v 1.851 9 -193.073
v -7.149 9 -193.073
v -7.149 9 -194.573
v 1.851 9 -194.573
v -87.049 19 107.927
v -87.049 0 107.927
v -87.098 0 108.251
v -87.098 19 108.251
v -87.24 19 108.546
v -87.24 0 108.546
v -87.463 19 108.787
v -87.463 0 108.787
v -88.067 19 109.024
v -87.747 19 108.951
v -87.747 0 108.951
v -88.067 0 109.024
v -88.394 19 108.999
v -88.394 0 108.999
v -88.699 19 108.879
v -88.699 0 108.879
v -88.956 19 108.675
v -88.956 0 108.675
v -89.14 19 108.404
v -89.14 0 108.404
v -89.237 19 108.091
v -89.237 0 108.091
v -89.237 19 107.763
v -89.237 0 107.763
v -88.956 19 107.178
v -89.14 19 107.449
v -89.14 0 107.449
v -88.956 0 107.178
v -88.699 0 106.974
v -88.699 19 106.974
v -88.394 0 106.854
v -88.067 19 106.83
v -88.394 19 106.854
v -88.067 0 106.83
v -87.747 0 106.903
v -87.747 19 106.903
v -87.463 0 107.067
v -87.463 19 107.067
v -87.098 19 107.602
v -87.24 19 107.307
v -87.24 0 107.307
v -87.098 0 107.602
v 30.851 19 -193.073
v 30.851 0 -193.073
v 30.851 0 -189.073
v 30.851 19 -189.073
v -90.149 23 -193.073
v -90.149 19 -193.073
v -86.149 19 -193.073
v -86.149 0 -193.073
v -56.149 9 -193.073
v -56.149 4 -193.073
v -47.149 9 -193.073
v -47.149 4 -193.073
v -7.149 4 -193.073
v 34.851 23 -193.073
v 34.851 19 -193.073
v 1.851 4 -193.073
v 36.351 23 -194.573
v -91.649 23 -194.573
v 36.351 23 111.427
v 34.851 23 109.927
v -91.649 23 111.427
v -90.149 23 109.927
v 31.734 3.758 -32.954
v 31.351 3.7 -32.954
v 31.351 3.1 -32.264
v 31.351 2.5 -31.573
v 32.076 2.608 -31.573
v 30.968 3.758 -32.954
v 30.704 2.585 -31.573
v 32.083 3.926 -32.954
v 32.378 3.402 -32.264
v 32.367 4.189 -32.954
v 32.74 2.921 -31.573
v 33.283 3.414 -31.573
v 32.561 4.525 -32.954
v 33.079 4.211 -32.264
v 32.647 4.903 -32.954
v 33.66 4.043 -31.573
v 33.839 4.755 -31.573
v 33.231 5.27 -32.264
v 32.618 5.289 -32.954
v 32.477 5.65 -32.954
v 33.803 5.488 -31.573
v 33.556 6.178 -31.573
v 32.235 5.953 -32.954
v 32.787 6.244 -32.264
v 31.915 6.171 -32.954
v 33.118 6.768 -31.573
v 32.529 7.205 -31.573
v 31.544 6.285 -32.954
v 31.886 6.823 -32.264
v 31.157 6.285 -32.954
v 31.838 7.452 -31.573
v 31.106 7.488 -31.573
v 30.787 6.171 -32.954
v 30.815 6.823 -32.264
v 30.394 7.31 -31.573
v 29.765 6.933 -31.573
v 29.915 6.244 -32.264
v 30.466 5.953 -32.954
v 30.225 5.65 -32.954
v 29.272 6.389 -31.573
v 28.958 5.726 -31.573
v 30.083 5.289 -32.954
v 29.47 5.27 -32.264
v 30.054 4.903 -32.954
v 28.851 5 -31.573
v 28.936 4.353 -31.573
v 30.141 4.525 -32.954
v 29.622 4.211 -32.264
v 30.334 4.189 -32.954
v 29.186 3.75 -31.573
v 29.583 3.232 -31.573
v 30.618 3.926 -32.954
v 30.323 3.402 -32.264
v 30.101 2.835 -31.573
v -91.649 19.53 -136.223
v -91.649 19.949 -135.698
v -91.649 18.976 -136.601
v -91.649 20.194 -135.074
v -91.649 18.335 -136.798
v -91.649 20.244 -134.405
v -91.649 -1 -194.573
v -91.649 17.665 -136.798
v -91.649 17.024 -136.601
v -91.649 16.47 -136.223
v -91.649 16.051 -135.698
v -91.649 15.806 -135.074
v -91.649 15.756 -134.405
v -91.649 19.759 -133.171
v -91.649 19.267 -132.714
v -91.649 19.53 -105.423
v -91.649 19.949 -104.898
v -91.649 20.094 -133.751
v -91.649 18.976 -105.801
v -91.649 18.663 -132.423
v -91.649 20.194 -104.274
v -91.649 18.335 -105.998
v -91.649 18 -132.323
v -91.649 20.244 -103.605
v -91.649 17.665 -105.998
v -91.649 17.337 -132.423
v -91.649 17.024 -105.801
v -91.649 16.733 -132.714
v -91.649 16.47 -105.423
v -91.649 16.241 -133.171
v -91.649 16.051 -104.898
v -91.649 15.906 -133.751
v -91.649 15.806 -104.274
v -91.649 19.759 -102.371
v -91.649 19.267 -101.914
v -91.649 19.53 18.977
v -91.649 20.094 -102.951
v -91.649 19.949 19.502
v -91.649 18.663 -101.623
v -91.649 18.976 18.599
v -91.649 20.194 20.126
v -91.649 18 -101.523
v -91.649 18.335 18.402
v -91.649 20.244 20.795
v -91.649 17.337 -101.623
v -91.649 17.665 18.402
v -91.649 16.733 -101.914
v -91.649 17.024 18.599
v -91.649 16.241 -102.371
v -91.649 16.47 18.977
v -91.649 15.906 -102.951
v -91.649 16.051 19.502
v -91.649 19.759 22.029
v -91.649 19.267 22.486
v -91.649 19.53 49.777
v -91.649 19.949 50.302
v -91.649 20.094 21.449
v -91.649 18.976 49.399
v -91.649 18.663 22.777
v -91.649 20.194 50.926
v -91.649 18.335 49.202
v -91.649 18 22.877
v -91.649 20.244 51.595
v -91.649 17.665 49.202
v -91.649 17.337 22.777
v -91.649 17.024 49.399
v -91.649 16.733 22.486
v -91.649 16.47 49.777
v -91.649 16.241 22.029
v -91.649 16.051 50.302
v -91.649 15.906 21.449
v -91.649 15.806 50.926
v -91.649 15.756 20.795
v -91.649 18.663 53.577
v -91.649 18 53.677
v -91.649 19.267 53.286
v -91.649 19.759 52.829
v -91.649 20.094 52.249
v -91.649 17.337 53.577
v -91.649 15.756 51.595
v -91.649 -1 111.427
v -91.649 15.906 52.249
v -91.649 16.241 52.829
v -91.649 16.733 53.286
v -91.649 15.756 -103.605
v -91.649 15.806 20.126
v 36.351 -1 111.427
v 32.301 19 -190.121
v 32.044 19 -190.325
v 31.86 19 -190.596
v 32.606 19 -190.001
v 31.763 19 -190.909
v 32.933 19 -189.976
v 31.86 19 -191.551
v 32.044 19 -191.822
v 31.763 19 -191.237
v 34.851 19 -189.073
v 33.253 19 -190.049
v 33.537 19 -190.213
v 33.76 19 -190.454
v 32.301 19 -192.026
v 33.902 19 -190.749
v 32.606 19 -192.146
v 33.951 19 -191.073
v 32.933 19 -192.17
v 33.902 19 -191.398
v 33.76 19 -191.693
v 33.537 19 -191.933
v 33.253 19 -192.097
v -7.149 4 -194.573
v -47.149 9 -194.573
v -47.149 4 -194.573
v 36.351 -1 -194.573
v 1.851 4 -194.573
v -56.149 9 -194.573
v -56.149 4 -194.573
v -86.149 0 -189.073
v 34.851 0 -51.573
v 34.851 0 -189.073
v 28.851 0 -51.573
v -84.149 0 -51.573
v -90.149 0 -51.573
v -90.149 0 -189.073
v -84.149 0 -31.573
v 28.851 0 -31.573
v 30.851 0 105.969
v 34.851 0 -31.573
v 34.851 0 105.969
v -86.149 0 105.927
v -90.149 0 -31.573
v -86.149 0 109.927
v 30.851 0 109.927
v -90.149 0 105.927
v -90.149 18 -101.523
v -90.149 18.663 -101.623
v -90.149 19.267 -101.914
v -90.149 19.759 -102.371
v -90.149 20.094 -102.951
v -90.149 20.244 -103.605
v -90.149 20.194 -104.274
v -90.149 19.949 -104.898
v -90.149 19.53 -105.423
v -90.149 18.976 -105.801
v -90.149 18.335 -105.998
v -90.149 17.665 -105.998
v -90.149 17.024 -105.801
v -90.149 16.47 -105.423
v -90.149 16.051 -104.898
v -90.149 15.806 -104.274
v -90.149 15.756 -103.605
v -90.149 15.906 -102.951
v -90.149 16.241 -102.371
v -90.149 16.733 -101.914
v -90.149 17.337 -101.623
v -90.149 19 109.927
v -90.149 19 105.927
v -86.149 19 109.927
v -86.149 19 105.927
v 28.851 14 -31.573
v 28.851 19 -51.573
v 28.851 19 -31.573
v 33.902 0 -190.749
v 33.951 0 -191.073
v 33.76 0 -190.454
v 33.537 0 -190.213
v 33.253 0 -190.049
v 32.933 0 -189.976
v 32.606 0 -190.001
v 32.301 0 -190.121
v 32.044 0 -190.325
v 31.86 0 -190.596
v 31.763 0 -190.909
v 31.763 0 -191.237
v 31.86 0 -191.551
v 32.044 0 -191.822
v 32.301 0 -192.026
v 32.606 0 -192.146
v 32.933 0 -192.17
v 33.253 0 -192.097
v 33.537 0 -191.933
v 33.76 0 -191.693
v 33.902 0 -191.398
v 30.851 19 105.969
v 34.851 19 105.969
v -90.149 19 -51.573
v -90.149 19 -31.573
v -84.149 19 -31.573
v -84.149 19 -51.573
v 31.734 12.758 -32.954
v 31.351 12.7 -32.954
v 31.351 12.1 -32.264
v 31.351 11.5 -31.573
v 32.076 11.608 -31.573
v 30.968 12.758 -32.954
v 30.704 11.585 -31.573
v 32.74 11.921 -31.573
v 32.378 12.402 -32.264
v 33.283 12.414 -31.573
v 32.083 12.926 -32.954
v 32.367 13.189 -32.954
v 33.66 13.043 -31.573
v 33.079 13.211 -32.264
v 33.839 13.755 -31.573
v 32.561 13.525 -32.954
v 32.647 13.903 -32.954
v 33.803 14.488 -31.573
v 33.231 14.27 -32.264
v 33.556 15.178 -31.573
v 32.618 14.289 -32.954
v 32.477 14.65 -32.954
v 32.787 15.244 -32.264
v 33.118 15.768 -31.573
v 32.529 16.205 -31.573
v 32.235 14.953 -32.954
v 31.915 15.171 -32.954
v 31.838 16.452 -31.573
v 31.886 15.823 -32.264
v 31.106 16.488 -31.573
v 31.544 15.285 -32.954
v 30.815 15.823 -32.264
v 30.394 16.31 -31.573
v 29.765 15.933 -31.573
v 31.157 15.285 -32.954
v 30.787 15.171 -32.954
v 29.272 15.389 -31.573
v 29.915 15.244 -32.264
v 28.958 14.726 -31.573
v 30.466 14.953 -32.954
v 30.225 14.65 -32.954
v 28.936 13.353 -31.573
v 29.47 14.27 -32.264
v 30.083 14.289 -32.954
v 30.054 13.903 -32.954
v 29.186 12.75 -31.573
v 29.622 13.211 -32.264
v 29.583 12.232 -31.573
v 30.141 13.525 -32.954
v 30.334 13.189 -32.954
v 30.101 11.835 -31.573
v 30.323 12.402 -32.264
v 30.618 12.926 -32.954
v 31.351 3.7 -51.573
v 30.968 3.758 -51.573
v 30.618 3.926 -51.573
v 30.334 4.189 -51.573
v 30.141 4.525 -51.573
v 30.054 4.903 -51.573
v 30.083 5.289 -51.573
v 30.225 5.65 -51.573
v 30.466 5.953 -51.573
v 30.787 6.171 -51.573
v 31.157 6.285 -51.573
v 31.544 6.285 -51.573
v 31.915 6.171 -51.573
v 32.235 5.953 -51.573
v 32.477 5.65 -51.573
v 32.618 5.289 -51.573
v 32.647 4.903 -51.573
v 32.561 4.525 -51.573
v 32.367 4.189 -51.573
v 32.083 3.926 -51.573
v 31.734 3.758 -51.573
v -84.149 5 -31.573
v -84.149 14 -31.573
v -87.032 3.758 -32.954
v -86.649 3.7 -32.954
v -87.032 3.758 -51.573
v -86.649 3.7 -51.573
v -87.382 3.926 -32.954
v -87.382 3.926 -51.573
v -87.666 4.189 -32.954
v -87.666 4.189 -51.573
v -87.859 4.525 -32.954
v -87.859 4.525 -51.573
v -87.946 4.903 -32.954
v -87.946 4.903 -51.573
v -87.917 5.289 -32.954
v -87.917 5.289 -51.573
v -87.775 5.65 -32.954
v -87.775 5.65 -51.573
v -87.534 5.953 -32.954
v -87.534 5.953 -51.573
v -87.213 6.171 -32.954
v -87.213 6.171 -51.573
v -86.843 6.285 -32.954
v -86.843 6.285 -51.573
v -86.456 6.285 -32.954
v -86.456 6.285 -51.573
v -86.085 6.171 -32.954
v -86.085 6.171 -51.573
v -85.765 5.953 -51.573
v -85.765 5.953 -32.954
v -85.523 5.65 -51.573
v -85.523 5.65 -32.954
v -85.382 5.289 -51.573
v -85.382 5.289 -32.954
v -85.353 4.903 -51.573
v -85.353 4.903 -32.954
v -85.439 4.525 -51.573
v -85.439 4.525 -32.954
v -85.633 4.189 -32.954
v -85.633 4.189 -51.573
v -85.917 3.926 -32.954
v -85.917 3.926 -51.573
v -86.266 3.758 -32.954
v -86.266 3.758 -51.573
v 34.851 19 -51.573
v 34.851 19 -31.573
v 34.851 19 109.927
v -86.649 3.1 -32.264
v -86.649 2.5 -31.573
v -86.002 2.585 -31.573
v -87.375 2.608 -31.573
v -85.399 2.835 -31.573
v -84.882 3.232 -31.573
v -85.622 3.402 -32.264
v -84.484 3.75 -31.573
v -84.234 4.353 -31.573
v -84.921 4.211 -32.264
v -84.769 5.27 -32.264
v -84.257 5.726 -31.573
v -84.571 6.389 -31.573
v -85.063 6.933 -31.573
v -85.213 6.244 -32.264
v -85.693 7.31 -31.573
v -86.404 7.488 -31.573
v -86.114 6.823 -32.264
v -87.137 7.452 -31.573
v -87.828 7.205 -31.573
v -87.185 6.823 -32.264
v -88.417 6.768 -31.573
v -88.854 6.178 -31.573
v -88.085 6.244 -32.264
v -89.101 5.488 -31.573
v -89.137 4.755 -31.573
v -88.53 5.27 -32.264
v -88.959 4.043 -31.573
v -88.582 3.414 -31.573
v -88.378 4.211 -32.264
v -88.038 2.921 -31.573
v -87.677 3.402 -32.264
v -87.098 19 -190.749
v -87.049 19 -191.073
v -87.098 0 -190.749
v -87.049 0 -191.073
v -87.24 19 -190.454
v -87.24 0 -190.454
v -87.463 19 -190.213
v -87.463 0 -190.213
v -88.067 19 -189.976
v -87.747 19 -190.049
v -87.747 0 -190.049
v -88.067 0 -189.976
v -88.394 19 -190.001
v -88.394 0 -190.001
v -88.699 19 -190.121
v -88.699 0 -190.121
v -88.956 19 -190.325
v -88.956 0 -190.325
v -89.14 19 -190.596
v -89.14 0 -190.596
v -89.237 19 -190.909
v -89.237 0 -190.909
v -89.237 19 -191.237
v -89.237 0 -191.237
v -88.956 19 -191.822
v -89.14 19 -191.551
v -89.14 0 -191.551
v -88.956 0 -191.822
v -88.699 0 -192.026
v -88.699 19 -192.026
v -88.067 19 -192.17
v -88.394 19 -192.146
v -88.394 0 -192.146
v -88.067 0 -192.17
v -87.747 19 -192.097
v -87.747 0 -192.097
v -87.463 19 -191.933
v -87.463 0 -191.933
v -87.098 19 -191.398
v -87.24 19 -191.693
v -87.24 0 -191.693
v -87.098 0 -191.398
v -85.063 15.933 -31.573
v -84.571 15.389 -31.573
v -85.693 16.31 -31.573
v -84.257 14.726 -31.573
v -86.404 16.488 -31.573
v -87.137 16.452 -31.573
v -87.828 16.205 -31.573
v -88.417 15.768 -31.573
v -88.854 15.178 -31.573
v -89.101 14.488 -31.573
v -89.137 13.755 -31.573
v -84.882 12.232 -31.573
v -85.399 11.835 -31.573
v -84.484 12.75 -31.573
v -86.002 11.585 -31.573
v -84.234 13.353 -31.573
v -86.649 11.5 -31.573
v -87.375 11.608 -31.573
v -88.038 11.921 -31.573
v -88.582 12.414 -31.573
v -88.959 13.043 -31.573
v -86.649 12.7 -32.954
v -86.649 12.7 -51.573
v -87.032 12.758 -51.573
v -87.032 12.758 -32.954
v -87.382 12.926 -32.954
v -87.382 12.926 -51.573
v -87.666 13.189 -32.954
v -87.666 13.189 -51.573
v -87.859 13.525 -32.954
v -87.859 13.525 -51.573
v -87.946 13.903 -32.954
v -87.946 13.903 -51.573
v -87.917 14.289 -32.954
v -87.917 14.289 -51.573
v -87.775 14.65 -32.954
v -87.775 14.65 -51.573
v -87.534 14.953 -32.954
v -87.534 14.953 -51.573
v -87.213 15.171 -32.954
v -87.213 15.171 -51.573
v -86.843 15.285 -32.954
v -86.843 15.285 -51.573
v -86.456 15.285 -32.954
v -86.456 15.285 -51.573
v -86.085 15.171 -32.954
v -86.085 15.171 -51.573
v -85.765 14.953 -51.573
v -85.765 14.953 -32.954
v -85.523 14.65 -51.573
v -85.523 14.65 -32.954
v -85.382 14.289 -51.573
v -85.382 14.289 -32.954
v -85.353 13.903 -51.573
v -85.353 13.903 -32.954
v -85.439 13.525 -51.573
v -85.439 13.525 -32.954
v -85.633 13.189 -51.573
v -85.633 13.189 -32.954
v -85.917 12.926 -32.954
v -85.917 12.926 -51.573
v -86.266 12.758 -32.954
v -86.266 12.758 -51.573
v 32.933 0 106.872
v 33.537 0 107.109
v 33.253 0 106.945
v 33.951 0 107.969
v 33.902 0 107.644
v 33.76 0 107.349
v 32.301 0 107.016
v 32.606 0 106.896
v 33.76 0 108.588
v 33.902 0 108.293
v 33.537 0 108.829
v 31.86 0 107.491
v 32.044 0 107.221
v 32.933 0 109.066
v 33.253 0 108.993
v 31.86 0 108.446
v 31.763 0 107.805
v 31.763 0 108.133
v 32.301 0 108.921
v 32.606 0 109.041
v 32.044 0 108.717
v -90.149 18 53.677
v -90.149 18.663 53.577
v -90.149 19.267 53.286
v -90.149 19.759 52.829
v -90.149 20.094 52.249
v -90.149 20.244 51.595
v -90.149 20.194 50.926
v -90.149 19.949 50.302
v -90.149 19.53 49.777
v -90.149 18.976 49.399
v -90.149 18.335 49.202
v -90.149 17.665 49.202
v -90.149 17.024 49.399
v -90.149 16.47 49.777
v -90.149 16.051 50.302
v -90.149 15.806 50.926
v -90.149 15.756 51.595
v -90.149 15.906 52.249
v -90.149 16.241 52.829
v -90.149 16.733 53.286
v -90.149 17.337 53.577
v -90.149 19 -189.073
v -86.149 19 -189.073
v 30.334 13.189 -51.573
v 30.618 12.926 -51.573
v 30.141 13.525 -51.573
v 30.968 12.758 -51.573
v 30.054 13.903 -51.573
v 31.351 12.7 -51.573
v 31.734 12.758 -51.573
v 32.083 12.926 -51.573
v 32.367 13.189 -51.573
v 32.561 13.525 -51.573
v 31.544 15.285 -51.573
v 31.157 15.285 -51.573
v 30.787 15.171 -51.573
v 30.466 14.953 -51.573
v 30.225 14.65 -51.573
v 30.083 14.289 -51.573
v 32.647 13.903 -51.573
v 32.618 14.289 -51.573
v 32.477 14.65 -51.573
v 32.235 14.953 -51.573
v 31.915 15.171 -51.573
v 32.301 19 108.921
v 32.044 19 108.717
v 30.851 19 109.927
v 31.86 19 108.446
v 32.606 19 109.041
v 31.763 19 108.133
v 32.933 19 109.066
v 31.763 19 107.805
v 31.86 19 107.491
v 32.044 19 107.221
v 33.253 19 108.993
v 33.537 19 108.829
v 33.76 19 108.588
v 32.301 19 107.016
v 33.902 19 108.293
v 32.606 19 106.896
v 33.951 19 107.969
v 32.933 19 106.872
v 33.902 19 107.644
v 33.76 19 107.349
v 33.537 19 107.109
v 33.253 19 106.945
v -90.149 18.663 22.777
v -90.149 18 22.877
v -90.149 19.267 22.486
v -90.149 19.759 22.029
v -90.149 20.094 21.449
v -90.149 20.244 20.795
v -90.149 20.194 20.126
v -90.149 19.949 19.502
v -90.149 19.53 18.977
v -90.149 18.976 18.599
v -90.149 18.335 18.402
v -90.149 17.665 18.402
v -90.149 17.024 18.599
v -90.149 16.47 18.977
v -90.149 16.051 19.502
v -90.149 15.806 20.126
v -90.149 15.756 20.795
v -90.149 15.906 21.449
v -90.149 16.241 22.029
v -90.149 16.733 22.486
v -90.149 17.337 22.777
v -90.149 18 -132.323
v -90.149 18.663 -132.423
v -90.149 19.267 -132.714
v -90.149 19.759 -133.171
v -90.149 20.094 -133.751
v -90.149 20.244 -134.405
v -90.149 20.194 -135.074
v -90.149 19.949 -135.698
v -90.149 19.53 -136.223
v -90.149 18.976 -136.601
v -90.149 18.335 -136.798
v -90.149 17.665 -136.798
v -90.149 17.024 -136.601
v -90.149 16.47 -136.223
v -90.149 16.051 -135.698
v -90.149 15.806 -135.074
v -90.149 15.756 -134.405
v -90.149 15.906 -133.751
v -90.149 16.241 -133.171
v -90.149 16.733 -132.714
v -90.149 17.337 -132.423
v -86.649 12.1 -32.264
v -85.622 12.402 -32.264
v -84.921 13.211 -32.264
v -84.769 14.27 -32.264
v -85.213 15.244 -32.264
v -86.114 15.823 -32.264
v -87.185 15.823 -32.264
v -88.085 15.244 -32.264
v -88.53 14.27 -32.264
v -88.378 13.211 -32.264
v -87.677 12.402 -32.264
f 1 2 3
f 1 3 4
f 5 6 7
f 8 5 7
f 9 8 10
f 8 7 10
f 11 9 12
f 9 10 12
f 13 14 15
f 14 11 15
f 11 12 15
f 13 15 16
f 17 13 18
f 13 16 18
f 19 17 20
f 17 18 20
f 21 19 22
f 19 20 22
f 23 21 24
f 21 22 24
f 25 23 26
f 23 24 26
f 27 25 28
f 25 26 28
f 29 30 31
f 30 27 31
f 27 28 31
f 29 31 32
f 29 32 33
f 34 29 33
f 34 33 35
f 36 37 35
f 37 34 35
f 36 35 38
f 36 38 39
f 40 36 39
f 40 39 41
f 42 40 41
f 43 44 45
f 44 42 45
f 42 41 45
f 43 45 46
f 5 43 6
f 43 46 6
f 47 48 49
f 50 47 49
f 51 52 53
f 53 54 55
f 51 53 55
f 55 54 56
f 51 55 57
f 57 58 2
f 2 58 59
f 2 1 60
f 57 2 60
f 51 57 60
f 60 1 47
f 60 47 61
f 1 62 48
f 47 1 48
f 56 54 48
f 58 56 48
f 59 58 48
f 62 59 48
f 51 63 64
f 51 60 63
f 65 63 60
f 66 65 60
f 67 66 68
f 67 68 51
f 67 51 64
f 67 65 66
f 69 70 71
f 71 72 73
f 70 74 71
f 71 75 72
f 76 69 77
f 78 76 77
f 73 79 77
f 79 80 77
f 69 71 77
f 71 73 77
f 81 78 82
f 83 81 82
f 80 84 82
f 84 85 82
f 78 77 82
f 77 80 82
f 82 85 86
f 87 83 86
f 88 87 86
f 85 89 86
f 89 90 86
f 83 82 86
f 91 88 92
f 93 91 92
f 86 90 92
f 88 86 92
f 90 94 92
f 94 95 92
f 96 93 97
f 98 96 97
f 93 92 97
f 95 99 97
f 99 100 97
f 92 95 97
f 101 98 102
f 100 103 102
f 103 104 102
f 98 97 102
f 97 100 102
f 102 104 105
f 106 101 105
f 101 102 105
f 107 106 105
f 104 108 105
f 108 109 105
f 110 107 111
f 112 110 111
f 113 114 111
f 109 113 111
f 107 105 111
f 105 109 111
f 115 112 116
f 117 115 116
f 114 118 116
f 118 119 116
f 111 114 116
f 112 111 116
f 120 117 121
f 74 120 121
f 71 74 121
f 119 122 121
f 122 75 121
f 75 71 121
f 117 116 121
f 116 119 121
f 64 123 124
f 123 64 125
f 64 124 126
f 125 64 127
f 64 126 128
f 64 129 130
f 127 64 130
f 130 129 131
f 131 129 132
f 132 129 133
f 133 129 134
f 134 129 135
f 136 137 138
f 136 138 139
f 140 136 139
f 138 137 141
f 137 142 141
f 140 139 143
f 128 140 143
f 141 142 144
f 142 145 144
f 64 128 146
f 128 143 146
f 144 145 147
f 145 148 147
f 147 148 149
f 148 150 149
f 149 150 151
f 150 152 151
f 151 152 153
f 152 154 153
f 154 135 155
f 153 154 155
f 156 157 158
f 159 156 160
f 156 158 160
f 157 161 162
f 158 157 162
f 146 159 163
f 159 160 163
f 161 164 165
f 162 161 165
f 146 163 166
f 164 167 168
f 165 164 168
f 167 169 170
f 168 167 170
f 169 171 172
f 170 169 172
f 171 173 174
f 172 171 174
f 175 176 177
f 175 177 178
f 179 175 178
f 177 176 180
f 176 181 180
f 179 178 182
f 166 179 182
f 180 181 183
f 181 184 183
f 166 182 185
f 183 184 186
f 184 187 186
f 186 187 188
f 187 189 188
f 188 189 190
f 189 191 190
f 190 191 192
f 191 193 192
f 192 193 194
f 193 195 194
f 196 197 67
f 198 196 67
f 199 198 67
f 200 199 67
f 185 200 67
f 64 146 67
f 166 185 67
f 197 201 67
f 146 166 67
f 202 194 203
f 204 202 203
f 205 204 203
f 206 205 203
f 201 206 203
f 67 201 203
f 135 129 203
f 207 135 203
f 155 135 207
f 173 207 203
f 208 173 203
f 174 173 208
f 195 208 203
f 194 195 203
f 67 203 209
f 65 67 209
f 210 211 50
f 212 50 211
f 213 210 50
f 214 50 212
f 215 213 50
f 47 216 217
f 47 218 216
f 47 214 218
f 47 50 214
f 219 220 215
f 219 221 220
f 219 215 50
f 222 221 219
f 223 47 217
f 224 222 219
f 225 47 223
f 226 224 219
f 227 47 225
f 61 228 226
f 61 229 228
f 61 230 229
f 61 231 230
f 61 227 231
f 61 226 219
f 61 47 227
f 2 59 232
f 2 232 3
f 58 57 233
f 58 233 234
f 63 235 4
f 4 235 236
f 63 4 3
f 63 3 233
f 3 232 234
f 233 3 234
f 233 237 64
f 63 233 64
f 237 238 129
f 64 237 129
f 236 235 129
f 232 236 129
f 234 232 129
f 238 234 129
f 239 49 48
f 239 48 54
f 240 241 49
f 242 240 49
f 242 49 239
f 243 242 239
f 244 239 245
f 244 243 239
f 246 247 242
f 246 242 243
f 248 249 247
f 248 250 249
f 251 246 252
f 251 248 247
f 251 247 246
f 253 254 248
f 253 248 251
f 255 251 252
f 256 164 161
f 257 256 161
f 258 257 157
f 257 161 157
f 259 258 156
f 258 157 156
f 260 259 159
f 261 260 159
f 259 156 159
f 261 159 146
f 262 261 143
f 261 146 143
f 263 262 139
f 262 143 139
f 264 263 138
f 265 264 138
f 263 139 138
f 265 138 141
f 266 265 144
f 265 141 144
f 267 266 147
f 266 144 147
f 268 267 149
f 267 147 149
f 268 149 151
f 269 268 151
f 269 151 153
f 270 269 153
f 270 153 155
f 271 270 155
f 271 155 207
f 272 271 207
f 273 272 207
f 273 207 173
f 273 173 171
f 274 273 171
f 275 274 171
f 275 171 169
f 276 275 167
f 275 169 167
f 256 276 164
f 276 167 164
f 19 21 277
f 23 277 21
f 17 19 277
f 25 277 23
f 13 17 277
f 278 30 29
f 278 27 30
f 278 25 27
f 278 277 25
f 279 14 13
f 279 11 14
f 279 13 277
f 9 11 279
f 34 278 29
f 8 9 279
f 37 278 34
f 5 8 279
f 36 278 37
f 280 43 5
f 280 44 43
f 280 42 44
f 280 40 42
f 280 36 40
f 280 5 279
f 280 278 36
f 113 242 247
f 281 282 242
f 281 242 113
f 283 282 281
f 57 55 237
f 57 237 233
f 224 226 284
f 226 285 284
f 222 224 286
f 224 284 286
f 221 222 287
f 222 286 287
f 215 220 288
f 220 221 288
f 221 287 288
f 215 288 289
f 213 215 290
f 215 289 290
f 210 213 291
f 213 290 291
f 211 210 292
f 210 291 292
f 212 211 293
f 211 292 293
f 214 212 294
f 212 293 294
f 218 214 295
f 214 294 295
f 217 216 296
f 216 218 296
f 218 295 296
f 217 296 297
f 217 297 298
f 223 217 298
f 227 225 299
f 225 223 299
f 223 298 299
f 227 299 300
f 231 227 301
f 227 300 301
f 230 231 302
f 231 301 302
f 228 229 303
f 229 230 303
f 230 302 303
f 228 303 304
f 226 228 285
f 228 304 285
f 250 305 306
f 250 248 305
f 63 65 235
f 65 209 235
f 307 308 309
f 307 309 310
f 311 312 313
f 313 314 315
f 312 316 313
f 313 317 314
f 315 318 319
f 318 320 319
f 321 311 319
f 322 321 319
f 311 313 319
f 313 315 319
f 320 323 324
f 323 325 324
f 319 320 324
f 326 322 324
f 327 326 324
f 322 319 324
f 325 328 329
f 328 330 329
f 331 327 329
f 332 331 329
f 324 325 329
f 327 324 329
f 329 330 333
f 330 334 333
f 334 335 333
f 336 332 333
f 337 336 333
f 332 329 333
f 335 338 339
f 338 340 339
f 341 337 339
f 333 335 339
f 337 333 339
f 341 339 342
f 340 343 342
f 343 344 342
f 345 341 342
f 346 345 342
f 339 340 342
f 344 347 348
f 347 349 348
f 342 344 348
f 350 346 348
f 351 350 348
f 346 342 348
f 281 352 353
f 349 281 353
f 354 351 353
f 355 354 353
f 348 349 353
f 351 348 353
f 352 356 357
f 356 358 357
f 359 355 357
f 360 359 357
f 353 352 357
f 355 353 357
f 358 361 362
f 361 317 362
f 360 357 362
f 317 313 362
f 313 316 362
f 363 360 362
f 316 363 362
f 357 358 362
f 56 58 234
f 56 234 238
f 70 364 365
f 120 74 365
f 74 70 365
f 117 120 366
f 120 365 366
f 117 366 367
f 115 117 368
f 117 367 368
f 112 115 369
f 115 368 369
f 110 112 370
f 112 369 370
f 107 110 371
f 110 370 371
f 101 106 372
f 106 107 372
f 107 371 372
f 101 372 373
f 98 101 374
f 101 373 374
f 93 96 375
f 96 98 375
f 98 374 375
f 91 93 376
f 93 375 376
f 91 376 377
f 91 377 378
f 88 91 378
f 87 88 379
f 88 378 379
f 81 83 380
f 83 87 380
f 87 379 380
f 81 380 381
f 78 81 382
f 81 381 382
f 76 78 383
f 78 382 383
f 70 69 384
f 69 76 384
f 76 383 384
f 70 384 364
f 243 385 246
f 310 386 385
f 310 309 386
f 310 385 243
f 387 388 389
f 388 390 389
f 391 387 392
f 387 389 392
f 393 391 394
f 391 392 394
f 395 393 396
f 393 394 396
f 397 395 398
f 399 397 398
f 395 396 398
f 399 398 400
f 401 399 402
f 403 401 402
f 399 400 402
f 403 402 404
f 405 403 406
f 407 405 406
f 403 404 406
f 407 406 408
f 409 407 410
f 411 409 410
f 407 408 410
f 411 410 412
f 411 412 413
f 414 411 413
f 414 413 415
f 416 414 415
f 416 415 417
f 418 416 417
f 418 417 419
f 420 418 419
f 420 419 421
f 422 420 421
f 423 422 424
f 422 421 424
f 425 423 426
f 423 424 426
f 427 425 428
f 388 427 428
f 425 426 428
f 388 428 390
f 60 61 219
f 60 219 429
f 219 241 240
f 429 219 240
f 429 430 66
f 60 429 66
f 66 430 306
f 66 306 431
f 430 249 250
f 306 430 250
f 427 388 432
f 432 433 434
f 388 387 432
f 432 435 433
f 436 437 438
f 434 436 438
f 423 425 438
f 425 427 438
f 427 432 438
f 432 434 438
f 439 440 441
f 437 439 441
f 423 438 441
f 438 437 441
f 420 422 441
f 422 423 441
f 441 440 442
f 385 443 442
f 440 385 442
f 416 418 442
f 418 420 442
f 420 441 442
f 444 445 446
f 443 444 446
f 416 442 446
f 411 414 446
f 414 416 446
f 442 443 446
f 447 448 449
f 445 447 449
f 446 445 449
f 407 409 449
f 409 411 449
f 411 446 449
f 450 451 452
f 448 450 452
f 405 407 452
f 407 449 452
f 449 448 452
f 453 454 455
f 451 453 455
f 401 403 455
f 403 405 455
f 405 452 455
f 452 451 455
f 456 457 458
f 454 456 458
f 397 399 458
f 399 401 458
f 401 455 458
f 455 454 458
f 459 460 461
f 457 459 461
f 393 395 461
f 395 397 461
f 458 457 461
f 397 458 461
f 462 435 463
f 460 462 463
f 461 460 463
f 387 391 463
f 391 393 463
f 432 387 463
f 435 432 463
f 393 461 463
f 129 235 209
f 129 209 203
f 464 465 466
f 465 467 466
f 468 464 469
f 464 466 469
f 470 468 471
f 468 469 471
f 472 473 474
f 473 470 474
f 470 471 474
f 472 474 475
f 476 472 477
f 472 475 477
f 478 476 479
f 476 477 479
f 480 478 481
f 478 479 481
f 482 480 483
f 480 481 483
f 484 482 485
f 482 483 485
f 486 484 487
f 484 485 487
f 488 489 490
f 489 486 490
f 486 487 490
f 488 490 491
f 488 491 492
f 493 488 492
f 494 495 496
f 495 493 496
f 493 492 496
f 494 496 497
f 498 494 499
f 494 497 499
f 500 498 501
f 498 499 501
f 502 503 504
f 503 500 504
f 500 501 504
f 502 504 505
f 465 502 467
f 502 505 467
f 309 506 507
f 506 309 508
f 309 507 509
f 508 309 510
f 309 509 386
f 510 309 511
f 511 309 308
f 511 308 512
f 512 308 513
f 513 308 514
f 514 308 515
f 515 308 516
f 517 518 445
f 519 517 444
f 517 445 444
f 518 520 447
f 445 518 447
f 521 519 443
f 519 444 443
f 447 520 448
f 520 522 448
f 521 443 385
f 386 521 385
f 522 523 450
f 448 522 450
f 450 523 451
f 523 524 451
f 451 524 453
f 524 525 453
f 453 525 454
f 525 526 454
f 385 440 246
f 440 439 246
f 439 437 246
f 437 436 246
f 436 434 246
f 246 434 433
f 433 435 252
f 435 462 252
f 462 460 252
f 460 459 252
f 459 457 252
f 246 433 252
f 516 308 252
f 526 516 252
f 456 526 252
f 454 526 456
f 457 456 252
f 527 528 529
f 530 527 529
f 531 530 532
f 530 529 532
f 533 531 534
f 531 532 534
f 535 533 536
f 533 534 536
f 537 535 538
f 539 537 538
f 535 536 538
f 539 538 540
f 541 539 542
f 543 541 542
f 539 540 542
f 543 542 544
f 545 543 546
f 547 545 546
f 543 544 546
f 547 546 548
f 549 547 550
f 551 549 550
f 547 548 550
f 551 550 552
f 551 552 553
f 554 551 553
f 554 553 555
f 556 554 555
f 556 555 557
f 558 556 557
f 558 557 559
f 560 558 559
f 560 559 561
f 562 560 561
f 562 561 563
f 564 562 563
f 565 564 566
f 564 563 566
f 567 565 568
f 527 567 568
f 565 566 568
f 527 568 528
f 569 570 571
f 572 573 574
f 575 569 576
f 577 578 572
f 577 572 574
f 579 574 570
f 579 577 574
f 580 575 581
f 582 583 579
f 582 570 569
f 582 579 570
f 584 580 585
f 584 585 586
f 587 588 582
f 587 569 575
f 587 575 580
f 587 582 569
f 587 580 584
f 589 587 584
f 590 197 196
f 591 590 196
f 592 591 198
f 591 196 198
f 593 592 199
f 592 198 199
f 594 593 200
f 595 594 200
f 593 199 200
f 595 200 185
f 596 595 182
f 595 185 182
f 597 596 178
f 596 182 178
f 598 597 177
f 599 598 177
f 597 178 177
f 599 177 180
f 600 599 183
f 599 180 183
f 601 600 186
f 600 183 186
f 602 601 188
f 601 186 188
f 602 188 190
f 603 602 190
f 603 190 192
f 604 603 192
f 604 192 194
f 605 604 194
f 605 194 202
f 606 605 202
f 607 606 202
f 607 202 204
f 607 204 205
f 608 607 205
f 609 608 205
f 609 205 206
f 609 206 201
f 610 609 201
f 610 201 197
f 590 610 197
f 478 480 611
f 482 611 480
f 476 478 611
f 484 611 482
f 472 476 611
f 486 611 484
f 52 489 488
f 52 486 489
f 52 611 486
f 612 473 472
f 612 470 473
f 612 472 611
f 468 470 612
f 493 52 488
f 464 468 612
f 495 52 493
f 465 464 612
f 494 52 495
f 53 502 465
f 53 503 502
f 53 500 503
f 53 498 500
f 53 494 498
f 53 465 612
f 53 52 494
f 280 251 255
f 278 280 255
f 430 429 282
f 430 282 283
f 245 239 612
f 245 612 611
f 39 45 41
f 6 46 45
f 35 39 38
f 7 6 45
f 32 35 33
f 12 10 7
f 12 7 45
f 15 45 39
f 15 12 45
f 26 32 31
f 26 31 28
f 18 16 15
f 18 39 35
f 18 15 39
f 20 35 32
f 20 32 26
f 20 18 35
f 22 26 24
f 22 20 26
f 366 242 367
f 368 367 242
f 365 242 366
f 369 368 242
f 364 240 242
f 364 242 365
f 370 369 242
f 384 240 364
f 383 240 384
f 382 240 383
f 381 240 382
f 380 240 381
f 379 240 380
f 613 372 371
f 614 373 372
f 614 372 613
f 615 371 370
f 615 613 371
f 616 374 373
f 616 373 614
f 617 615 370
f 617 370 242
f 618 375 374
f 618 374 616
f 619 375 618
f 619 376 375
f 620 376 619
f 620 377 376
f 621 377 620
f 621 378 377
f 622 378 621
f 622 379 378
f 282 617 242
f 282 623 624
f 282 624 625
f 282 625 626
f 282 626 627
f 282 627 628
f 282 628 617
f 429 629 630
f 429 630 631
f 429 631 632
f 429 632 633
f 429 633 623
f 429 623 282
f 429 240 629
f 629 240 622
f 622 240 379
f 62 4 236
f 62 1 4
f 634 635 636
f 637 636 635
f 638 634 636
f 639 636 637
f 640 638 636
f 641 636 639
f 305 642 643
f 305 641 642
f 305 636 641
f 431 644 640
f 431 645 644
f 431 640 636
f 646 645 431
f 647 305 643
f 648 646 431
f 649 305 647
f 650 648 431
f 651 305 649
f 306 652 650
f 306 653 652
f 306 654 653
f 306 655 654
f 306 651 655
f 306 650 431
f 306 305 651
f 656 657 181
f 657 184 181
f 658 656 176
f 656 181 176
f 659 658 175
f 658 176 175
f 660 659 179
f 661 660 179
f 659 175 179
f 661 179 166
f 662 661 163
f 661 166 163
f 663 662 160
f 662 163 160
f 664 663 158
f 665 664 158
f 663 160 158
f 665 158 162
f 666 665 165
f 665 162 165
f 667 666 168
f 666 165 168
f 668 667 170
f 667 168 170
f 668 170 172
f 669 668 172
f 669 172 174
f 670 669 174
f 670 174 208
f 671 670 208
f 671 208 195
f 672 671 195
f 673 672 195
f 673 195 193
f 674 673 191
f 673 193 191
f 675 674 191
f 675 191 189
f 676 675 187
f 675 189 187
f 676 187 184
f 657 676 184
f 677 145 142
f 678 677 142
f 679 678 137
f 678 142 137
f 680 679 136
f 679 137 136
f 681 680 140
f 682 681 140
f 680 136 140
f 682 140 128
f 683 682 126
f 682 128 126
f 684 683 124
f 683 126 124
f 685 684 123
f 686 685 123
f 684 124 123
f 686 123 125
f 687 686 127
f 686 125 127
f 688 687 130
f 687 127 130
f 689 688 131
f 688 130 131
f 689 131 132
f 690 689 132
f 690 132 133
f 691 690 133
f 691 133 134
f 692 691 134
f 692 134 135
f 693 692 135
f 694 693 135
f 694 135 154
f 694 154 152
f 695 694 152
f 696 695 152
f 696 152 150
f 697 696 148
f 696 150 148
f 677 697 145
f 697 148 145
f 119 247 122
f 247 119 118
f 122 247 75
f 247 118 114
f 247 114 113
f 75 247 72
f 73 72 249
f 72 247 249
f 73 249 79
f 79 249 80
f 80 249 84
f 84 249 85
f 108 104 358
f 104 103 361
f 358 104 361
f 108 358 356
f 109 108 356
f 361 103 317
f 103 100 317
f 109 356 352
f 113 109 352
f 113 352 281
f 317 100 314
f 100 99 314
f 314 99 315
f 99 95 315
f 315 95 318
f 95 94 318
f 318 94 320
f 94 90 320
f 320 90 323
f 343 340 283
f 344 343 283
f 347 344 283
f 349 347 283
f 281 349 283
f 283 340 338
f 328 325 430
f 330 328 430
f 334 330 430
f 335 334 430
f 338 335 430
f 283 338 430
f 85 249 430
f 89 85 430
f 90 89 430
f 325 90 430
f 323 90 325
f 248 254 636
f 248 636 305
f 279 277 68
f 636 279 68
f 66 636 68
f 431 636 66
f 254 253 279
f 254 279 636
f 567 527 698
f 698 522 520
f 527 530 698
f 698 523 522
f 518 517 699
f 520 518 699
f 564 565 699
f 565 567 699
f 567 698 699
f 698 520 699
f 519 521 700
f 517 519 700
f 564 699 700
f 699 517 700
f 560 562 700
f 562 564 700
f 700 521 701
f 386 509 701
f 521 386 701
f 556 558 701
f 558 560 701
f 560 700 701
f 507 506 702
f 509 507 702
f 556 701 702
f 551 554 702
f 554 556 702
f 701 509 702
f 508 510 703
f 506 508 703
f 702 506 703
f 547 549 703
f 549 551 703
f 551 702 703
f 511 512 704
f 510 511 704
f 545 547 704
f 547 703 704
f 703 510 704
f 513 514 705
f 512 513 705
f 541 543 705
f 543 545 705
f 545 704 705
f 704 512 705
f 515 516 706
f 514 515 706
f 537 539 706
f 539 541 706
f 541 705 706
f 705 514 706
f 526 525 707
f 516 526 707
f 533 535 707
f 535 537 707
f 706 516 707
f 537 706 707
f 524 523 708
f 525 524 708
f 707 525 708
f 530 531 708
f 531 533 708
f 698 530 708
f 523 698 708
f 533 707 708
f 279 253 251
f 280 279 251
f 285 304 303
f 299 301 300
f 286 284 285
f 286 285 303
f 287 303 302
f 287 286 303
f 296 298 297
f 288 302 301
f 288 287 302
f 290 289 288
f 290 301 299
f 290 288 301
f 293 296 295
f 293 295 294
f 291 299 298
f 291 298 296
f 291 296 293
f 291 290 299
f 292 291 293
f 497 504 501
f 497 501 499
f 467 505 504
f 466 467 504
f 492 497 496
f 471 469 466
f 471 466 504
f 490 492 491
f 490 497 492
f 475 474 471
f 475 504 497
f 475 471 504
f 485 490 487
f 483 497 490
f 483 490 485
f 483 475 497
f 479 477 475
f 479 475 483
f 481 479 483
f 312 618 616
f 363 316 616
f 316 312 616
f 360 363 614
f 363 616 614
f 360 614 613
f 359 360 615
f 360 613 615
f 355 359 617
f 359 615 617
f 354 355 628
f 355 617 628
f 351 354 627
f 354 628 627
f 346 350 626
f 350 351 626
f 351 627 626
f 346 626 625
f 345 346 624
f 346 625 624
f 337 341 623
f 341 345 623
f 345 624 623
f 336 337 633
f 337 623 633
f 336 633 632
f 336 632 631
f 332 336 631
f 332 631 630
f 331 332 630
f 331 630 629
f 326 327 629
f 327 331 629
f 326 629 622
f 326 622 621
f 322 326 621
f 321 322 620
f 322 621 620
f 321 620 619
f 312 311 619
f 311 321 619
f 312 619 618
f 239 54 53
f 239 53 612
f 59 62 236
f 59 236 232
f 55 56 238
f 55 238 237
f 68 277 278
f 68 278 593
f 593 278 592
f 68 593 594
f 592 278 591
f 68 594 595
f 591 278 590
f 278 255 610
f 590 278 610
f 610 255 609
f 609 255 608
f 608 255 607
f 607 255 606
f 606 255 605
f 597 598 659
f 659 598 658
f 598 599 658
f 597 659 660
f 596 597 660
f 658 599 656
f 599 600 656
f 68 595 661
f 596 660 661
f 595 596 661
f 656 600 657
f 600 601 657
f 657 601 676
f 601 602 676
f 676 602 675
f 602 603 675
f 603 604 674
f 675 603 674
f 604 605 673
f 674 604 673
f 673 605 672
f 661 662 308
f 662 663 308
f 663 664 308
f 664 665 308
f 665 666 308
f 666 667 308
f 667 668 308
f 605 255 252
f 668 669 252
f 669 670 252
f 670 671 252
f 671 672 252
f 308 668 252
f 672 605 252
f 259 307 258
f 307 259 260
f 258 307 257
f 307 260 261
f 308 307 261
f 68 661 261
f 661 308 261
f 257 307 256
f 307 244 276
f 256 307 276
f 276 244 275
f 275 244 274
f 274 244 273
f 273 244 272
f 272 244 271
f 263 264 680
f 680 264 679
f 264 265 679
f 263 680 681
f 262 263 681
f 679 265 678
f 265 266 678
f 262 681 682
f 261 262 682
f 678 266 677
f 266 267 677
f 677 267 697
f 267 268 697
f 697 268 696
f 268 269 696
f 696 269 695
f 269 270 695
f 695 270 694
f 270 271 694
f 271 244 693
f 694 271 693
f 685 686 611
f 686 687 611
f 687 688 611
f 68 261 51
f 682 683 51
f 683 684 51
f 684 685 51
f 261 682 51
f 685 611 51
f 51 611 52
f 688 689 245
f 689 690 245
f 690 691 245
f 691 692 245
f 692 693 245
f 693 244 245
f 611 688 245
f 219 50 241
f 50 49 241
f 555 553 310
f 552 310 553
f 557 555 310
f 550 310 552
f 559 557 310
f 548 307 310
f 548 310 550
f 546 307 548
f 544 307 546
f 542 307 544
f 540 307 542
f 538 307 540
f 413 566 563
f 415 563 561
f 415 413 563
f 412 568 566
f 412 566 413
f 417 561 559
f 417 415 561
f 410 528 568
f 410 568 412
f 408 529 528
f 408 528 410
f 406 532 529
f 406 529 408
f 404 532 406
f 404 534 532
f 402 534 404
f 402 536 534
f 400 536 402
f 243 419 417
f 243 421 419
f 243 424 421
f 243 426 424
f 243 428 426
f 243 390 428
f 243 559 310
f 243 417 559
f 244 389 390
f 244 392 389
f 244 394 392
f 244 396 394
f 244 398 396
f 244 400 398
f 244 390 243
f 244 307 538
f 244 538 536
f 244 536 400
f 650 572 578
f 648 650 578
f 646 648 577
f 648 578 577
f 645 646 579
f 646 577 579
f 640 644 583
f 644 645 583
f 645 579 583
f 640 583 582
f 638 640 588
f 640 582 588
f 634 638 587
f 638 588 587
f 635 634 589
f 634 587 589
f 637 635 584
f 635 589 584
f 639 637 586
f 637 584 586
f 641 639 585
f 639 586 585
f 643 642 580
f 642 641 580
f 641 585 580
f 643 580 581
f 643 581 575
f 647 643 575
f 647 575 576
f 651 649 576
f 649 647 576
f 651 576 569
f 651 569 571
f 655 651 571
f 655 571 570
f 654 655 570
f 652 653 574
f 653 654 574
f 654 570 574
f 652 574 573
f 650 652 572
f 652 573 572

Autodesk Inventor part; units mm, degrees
ref_plane "YZ Plane" through (0, 0, 0) normal (1, 0, 0) x (0, 1, 0)
ref_plane "XZ Plane" through (0, 0, 0) normal (0, 1, 0) x (-1, 0, 0)
ref_plane "XY Plane" through (0, 0, 0) normal (0, 0, 1) x (1, 0, 0)
sketch "Sketch1" plane through (0, 0, 0) normal (0, 1, 0) x (-1, 0, 0)
  line L0 (80.1493, 105.9266) -> (-24.8507, 105.9266) construction
  line L1 (-24.8507, 105.9266) -> (-24.8507, -189.0734) construction
  line L2 (-24.8507, -189.0734) -> (80.1493, -189.0734) construction
  line L3 (80.1493, -189.0734) -> (80.1493, 105.9266) construction
  line L4 (80.1493, 91.9266) -> (83.1493, 91.9266) construction
  line L5 (83.1493, 91.9266) -> (83.1493, 84.3266) construction
  line L6 (83.1493, 84.3266) -> (80.1493, 84.3266) construction
  line L7 (80.1493, 84.3266) -> (80.1493, 91.9266) construction
  point P0 (0, 0)
  dimension "d0" = 295
  dimension "d1" = 105
  dimension "d2" = 7.6
  dimension "d3" = 3
  dimension "d4" = 14
sketch "Sketch2" plane through (0, 0, 0) normal (0, 1, 0) x (-1, 0, 0)
  line L0 (80.1493, -189.0734) -> (80.1493, 105.9266) construction
  line L1 (-24.8507, -189.0734) -> (80.1493, -189.0734) construction
  line L2 (-24.8507, 105.9266) -> (-24.8507, -189.0734) construction
  line L3 (80.1493, 105.9266) -> (-24.8507, 105.9266) construction
  line L4 (90.1493, 109.9266) -> (90.1493, -193.0734)
  line L5 (-34.8507, -193.0734) -> (-34.8507, 109.9266)
  line L6 (90.1493, 109.9266) -> (-34.8507, 109.9266)
  line L7 (90.1493, -193.0734) -> (-34.8507, -193.0734)
  line L8 (91.6493, -194.5734) -> (91.6493, 111.4266)
  line L9 (91.6493, 111.4266) -> (-36.3507, 111.4266)
  line L10 (-36.3507, 111.4266) -> (-36.3507, -194.5734)
  line L11 (-36.3507, -194.5734) -> (91.6493, -194.5734)
  dimension "d71" = 10
  dimension "d72" = 4
  dimension "d73" = 10
  dimension "d74" = 4
  dimension "d75" = 1.5
extrude "Extrusion1" add sketch "Sketch2" against normal blind 1 contours L4 L7 L5 L6
extrude "Extrusion2" add sketch "Sketch2" along normal blind 23 and the other way blind 1
sketch "Sketch5" plane through (-91.6493, -1, 111.4266) normal (-1, 0, 0) x (0, 0, 1)
  circle A0 centre (-246, 19) radius 2.25
  circle A1 centre (-90.8, 19) radius 2.25
  circle A2 centre (-215.2, 19) radius 2.25
  circle A3 centre (-60, 19) radius 2.25
  line L0 (0, 0) -> (0, 24) projected
  line L1 (-306, 24) -> (0, 24) projected
  line L2 (-306, 24) -> (-306, 0) projected
  line L3 (0, 0) -> (-306, 0) projected
  point P0 (-111.4266, 1)
  dimension "d35" = 4.5
  dimension "d37" = 4.5
  dimension "d39" = 4.5
  dimension "d40" = 0
  dimension "d41" = 30.8
  dimension "d45" = 4.5
  dimension "d46" = 0
  dimension "d47" = 30.8
  dimension "d76" = 60
  dimension "d77" = 60
  dimension "d144" = 5
  dimension "d145" = 5
extrude "Extrusion4" cut sketch "Sketch5" against normal up to surface (1.5 mm away) contours A0 | A1 | A2 | A3
sketch "Sketch7" plane through (-90.1493, 0, -193.0734) normal (1, 0, 0) x (0, 0, -1)
  line L0 (-151.5, 23) -> (-151.5, 0) construction
  line L1 (-141.5, 19) -> (-141.5, 0)
  line L2 (-161.5, 19) -> (-161.5, 0)
  line L3 (-303, 23) -> (0, 23) projected
  line L4 (-303, 0) -> (0, 0) projected
  line L5 (0, 23) -> (0, 0) projected
  line L6 (-161.5, 19) -> (-141.5, 19)
  point P0 (-141.5, 23)
  point P1 (-161.5, 23)
  dimension "d106" = 10
  dimension "d107" = 10
  dimension "d148" = 151.5
  dimension "d149" = 151.5
  dimension "d193" = 19
extrude "Extrusion6" add sketch "Sketch7" along normal blind 6
ref_plane "Work Plane2" through (-27.6493, 0, 109.9266) normal (1, 0, 0) x (0, 0, -1)
ref_plane "Work Plane4" through (-90.1493, 0, -41.5734) normal (0, 0, 1) x (1, 0, 0)
sketch "Sketch16" plane through (-90.1493, 0, -31.5734) normal (0, 0, 1) x (1, 0, 0)
  line L0 (0, 0) -> (0, 19) projected
  line L1 (0, 19) -> (6, 19) projected
  point P0 (90.1493, 0)
  point P1 (3.5, 14)
  dimension "d108" = 3.5
  dimension "d194" = 5
hole "Hole3" at (-86.6493, 14, -31.5734) direction (0, 0, -1) diameter 2.6 depth 5 countersink diameter 5 countersink angle 82
sketch "Sketch17" plane through (-86.6493, 14, -36.5734) normal (0, 0, 1) x (1, 0, 0)
  circle A0 centre (0, 0) radius 1.3 projected
  point P0 (86.6493, -14)
hole "Hole4" at (-86.6493, 14, -36.5734) direction (0, 0, -1) diameter 2.6 depth 15 tip angle 118
sketch "Sketch18" plane through (-90.1493, 0, -31.5734) normal (0, 0, 1) x (1, 0, 0)
  line L0 (0, 0) -> (0, 19) projected
  line L1 (6, 0) -> (0, 0) projected
  point P0 (90.1493, 0)
  point P1 (3.5, 5)
  point P2 (0, 18)
  point P3 (0, 23)
  dimension "d124" = 3.5
  dimension "d125" = 5
hole "Hole5" at (-86.6493, 5, -31.5734) direction (0, 0, -1) diameter 2.6 depth 5 countersink diameter 5 countersink angle 82
sketch "Sketch19" plane through (-86.6493, 5, -36.5734) normal (0, 0, 1) x (1, 0, 0)
  circle A0 centre (0, 0) radius 1.3 projected
  point P0 (86.6493, -5)
hole "Hole6" at (-86.6493, 5, -36.5734) direction (0, 0, -1) diameter 2.6 depth 15 tip angle 118
mirror "Mirror6" about plane through (-27.6493, 0, 109.9266) normal (1, 0, 0) of "Extrusion6", "Hole3", "Hole5", "Hole4", "Hole6"
sketch "Sketch23" plane through (0, 0, 0) normal (0, 1, 0) x (1, 0, 0)
  line L0 (-90.1493, 193.0734) -> (34.8507, 193.0734) projected
  line L1 (34.8507, 193.0734) -> (30.8507, 193.0734)
  line L2 (30.8507, 193.0734) -> (30.8507, 189.0734)
  line L3 (30.8507, 189.0734) -> (34.8507, 189.0734)
  line L4 (34.8507, 189.0734) -> (34.8507, 193.0734)
  circle A0 centre (32.8507, 191.0734) radius 1.1
  line L5 (-90.1493, 193.0734) -> (-86.1493, 193.0734)
  line L6 (-86.1493, 193.0734) -> (-86.1493, 189.0734)
  line L7 (-86.1493, 189.0734) -> (-90.1493, 189.0734)
  line L8 (-90.1493, 189.0734) -> (-90.1493, 193.0734)
  circle A1 centre (-88.1493, 191.0734) radius 1.1
  line L9 (34.8507, -109.9687) -> (30.8507, -109.9687)
  line L10 (30.8507, -109.9687) -> (30.8507, -105.9687)
  line L11 (30.8507, -105.9687) -> (34.8507, -105.9687)
  line L12 (34.8507, -105.9687) -> (34.8507, -109.9687)
  circle A2 centre (32.8507, -107.9687) radius 1.1
  line L13 (34.8507, -109.9266) -> (-90.1493, -109.9266) projected
  line L14 (-90.1493, -109.9266) -> (-86.1493, -109.9266)
  line L15 (-86.1493, -109.9266) -> (-86.1493, -105.9266)
  line L16 (-86.1493, -105.9266) -> (-90.1493, -105.9266)
  line L17 (-90.1493, -105.9266) -> (-90.1493, -109.9266)
  circle A3 centre (-88.1493, -107.9266) radius 1.1
  point P0 (0, 0)
  dimension "d159" = 4
  dimension "d160" = 4
  dimension "d161" = 2.2
  dimension "d162" = 2
  dimension "d163" = 2
  dimension "d164" = 4
  dimension "d165" = 4
  dimension "d166" = 2.2
  dimension "d167" = 2
  dimension "d168" = 2
  dimension "d169" = 4
  dimension "d170" = 4
  dimension "d171" = 2.2
  dimension "d172" = 2
  dimension "d173" = 2
  dimension "d174" = 4
  dimension "d175" = 4
  dimension "d176" = 2.2
  dimension "d177" = 2
  dimension "d178" = 2
extrude "Extrusion14" add sketch "Sketch23" along normal blind 19
sketch "Sketch24" plane through (-90.1493, 23, -193.0734) normal (0, 0, 1) x (1, 0, 0)
  line L0 (34, -14) -> (43, -14)
  line L1 (43, -14) -> (43, -19)
  line L2 (43, -19) -> (34, -19)
  line L3 (34, -19) -> (34, -14)
  line L4 (4, -23) -> (121, -23) projected
  line L5 (4, -23) -> (4, -4) projected
  line L6 (83, -14) -> (92, -14)
  line L7 (92, -14) -> (92, -19)
  line L8 (92, -19) -> (83, -19)
  line L9 (83, -19) -> (83, -14)
  point P0 (90.1493, -23)
  dimension "d181" = 9
  dimension "d182" = 5
  dimension "d183" = 4
  dimension "d184" = 30
  dimension "d187" = 9
  dimension "d188" = 5
  dimension "d189" = 40
  dimension "d190" = 4
extrude "Extrusion15" cut sketch "Sketch24" against normal through all
sketch "Sketch25" plane through (-90.1493, 0, -41.5734) normal (0, 0, 1) x (1, 0, 0)
  line L0 (169.9232, 195.9359) -> (-46.5393, 195.9359)
  line L1 (-46.5393, 195.9359) -> (-46.5393, -158.6148)
  line L2 (-46.5393, -158.6148) -> (169.9232, -158.6148)
  line L3 (169.9232, -158.6148) -> (169.9232, 195.9359)
  point P0 (90.1493, 0)
extrude "Extrusion16" [suppressed]
sketch "Sketch27" plane through (0, 23, 0) normal (0, 1, 0) x (1, 0, 0)
  line L0 (34.8507, 193.0734) -> (34.8507, -109.9266) projected
  line L1 (-90.1493, 193.0734) -> (34.8507, 193.0734) projected
  line L2 (-90.1493, -109.9266) -> (-90.1493, 193.0734) projected
  line L3 (34.8507, -109.9266) -> (-90.1493, -109.9266) projected
  line L4 (-90.1493, 136.8234) -> (-90.1493, 132.3234) projected
  line L5 (-91.6493, 132.3234) -> (-91.6493, 136.8234) projected
  line L6 (-91.6493, 101.5234) -> (-91.6493, 106.0234) projected
  line L7 (-91.6493, -22.8766) -> (-91.6493, -18.3766) projected
  line L8 (-91.6493, -53.6766) -> (-91.6493, -49.1766) projected
  point P0 (0, 0)
  dimension "d196" = 56.25
  dimension "d197" = 4.5
  dimension "d198" = 26.3
  dimension "d199" = 4.5
  dimension "d200" = 119.9
  dimension "d201" = 4.5
  dimension "d202" = 26.3
  dimension "d203" = 4.5
  dimension "d204" = 56.25
properties part number "Case Board"
